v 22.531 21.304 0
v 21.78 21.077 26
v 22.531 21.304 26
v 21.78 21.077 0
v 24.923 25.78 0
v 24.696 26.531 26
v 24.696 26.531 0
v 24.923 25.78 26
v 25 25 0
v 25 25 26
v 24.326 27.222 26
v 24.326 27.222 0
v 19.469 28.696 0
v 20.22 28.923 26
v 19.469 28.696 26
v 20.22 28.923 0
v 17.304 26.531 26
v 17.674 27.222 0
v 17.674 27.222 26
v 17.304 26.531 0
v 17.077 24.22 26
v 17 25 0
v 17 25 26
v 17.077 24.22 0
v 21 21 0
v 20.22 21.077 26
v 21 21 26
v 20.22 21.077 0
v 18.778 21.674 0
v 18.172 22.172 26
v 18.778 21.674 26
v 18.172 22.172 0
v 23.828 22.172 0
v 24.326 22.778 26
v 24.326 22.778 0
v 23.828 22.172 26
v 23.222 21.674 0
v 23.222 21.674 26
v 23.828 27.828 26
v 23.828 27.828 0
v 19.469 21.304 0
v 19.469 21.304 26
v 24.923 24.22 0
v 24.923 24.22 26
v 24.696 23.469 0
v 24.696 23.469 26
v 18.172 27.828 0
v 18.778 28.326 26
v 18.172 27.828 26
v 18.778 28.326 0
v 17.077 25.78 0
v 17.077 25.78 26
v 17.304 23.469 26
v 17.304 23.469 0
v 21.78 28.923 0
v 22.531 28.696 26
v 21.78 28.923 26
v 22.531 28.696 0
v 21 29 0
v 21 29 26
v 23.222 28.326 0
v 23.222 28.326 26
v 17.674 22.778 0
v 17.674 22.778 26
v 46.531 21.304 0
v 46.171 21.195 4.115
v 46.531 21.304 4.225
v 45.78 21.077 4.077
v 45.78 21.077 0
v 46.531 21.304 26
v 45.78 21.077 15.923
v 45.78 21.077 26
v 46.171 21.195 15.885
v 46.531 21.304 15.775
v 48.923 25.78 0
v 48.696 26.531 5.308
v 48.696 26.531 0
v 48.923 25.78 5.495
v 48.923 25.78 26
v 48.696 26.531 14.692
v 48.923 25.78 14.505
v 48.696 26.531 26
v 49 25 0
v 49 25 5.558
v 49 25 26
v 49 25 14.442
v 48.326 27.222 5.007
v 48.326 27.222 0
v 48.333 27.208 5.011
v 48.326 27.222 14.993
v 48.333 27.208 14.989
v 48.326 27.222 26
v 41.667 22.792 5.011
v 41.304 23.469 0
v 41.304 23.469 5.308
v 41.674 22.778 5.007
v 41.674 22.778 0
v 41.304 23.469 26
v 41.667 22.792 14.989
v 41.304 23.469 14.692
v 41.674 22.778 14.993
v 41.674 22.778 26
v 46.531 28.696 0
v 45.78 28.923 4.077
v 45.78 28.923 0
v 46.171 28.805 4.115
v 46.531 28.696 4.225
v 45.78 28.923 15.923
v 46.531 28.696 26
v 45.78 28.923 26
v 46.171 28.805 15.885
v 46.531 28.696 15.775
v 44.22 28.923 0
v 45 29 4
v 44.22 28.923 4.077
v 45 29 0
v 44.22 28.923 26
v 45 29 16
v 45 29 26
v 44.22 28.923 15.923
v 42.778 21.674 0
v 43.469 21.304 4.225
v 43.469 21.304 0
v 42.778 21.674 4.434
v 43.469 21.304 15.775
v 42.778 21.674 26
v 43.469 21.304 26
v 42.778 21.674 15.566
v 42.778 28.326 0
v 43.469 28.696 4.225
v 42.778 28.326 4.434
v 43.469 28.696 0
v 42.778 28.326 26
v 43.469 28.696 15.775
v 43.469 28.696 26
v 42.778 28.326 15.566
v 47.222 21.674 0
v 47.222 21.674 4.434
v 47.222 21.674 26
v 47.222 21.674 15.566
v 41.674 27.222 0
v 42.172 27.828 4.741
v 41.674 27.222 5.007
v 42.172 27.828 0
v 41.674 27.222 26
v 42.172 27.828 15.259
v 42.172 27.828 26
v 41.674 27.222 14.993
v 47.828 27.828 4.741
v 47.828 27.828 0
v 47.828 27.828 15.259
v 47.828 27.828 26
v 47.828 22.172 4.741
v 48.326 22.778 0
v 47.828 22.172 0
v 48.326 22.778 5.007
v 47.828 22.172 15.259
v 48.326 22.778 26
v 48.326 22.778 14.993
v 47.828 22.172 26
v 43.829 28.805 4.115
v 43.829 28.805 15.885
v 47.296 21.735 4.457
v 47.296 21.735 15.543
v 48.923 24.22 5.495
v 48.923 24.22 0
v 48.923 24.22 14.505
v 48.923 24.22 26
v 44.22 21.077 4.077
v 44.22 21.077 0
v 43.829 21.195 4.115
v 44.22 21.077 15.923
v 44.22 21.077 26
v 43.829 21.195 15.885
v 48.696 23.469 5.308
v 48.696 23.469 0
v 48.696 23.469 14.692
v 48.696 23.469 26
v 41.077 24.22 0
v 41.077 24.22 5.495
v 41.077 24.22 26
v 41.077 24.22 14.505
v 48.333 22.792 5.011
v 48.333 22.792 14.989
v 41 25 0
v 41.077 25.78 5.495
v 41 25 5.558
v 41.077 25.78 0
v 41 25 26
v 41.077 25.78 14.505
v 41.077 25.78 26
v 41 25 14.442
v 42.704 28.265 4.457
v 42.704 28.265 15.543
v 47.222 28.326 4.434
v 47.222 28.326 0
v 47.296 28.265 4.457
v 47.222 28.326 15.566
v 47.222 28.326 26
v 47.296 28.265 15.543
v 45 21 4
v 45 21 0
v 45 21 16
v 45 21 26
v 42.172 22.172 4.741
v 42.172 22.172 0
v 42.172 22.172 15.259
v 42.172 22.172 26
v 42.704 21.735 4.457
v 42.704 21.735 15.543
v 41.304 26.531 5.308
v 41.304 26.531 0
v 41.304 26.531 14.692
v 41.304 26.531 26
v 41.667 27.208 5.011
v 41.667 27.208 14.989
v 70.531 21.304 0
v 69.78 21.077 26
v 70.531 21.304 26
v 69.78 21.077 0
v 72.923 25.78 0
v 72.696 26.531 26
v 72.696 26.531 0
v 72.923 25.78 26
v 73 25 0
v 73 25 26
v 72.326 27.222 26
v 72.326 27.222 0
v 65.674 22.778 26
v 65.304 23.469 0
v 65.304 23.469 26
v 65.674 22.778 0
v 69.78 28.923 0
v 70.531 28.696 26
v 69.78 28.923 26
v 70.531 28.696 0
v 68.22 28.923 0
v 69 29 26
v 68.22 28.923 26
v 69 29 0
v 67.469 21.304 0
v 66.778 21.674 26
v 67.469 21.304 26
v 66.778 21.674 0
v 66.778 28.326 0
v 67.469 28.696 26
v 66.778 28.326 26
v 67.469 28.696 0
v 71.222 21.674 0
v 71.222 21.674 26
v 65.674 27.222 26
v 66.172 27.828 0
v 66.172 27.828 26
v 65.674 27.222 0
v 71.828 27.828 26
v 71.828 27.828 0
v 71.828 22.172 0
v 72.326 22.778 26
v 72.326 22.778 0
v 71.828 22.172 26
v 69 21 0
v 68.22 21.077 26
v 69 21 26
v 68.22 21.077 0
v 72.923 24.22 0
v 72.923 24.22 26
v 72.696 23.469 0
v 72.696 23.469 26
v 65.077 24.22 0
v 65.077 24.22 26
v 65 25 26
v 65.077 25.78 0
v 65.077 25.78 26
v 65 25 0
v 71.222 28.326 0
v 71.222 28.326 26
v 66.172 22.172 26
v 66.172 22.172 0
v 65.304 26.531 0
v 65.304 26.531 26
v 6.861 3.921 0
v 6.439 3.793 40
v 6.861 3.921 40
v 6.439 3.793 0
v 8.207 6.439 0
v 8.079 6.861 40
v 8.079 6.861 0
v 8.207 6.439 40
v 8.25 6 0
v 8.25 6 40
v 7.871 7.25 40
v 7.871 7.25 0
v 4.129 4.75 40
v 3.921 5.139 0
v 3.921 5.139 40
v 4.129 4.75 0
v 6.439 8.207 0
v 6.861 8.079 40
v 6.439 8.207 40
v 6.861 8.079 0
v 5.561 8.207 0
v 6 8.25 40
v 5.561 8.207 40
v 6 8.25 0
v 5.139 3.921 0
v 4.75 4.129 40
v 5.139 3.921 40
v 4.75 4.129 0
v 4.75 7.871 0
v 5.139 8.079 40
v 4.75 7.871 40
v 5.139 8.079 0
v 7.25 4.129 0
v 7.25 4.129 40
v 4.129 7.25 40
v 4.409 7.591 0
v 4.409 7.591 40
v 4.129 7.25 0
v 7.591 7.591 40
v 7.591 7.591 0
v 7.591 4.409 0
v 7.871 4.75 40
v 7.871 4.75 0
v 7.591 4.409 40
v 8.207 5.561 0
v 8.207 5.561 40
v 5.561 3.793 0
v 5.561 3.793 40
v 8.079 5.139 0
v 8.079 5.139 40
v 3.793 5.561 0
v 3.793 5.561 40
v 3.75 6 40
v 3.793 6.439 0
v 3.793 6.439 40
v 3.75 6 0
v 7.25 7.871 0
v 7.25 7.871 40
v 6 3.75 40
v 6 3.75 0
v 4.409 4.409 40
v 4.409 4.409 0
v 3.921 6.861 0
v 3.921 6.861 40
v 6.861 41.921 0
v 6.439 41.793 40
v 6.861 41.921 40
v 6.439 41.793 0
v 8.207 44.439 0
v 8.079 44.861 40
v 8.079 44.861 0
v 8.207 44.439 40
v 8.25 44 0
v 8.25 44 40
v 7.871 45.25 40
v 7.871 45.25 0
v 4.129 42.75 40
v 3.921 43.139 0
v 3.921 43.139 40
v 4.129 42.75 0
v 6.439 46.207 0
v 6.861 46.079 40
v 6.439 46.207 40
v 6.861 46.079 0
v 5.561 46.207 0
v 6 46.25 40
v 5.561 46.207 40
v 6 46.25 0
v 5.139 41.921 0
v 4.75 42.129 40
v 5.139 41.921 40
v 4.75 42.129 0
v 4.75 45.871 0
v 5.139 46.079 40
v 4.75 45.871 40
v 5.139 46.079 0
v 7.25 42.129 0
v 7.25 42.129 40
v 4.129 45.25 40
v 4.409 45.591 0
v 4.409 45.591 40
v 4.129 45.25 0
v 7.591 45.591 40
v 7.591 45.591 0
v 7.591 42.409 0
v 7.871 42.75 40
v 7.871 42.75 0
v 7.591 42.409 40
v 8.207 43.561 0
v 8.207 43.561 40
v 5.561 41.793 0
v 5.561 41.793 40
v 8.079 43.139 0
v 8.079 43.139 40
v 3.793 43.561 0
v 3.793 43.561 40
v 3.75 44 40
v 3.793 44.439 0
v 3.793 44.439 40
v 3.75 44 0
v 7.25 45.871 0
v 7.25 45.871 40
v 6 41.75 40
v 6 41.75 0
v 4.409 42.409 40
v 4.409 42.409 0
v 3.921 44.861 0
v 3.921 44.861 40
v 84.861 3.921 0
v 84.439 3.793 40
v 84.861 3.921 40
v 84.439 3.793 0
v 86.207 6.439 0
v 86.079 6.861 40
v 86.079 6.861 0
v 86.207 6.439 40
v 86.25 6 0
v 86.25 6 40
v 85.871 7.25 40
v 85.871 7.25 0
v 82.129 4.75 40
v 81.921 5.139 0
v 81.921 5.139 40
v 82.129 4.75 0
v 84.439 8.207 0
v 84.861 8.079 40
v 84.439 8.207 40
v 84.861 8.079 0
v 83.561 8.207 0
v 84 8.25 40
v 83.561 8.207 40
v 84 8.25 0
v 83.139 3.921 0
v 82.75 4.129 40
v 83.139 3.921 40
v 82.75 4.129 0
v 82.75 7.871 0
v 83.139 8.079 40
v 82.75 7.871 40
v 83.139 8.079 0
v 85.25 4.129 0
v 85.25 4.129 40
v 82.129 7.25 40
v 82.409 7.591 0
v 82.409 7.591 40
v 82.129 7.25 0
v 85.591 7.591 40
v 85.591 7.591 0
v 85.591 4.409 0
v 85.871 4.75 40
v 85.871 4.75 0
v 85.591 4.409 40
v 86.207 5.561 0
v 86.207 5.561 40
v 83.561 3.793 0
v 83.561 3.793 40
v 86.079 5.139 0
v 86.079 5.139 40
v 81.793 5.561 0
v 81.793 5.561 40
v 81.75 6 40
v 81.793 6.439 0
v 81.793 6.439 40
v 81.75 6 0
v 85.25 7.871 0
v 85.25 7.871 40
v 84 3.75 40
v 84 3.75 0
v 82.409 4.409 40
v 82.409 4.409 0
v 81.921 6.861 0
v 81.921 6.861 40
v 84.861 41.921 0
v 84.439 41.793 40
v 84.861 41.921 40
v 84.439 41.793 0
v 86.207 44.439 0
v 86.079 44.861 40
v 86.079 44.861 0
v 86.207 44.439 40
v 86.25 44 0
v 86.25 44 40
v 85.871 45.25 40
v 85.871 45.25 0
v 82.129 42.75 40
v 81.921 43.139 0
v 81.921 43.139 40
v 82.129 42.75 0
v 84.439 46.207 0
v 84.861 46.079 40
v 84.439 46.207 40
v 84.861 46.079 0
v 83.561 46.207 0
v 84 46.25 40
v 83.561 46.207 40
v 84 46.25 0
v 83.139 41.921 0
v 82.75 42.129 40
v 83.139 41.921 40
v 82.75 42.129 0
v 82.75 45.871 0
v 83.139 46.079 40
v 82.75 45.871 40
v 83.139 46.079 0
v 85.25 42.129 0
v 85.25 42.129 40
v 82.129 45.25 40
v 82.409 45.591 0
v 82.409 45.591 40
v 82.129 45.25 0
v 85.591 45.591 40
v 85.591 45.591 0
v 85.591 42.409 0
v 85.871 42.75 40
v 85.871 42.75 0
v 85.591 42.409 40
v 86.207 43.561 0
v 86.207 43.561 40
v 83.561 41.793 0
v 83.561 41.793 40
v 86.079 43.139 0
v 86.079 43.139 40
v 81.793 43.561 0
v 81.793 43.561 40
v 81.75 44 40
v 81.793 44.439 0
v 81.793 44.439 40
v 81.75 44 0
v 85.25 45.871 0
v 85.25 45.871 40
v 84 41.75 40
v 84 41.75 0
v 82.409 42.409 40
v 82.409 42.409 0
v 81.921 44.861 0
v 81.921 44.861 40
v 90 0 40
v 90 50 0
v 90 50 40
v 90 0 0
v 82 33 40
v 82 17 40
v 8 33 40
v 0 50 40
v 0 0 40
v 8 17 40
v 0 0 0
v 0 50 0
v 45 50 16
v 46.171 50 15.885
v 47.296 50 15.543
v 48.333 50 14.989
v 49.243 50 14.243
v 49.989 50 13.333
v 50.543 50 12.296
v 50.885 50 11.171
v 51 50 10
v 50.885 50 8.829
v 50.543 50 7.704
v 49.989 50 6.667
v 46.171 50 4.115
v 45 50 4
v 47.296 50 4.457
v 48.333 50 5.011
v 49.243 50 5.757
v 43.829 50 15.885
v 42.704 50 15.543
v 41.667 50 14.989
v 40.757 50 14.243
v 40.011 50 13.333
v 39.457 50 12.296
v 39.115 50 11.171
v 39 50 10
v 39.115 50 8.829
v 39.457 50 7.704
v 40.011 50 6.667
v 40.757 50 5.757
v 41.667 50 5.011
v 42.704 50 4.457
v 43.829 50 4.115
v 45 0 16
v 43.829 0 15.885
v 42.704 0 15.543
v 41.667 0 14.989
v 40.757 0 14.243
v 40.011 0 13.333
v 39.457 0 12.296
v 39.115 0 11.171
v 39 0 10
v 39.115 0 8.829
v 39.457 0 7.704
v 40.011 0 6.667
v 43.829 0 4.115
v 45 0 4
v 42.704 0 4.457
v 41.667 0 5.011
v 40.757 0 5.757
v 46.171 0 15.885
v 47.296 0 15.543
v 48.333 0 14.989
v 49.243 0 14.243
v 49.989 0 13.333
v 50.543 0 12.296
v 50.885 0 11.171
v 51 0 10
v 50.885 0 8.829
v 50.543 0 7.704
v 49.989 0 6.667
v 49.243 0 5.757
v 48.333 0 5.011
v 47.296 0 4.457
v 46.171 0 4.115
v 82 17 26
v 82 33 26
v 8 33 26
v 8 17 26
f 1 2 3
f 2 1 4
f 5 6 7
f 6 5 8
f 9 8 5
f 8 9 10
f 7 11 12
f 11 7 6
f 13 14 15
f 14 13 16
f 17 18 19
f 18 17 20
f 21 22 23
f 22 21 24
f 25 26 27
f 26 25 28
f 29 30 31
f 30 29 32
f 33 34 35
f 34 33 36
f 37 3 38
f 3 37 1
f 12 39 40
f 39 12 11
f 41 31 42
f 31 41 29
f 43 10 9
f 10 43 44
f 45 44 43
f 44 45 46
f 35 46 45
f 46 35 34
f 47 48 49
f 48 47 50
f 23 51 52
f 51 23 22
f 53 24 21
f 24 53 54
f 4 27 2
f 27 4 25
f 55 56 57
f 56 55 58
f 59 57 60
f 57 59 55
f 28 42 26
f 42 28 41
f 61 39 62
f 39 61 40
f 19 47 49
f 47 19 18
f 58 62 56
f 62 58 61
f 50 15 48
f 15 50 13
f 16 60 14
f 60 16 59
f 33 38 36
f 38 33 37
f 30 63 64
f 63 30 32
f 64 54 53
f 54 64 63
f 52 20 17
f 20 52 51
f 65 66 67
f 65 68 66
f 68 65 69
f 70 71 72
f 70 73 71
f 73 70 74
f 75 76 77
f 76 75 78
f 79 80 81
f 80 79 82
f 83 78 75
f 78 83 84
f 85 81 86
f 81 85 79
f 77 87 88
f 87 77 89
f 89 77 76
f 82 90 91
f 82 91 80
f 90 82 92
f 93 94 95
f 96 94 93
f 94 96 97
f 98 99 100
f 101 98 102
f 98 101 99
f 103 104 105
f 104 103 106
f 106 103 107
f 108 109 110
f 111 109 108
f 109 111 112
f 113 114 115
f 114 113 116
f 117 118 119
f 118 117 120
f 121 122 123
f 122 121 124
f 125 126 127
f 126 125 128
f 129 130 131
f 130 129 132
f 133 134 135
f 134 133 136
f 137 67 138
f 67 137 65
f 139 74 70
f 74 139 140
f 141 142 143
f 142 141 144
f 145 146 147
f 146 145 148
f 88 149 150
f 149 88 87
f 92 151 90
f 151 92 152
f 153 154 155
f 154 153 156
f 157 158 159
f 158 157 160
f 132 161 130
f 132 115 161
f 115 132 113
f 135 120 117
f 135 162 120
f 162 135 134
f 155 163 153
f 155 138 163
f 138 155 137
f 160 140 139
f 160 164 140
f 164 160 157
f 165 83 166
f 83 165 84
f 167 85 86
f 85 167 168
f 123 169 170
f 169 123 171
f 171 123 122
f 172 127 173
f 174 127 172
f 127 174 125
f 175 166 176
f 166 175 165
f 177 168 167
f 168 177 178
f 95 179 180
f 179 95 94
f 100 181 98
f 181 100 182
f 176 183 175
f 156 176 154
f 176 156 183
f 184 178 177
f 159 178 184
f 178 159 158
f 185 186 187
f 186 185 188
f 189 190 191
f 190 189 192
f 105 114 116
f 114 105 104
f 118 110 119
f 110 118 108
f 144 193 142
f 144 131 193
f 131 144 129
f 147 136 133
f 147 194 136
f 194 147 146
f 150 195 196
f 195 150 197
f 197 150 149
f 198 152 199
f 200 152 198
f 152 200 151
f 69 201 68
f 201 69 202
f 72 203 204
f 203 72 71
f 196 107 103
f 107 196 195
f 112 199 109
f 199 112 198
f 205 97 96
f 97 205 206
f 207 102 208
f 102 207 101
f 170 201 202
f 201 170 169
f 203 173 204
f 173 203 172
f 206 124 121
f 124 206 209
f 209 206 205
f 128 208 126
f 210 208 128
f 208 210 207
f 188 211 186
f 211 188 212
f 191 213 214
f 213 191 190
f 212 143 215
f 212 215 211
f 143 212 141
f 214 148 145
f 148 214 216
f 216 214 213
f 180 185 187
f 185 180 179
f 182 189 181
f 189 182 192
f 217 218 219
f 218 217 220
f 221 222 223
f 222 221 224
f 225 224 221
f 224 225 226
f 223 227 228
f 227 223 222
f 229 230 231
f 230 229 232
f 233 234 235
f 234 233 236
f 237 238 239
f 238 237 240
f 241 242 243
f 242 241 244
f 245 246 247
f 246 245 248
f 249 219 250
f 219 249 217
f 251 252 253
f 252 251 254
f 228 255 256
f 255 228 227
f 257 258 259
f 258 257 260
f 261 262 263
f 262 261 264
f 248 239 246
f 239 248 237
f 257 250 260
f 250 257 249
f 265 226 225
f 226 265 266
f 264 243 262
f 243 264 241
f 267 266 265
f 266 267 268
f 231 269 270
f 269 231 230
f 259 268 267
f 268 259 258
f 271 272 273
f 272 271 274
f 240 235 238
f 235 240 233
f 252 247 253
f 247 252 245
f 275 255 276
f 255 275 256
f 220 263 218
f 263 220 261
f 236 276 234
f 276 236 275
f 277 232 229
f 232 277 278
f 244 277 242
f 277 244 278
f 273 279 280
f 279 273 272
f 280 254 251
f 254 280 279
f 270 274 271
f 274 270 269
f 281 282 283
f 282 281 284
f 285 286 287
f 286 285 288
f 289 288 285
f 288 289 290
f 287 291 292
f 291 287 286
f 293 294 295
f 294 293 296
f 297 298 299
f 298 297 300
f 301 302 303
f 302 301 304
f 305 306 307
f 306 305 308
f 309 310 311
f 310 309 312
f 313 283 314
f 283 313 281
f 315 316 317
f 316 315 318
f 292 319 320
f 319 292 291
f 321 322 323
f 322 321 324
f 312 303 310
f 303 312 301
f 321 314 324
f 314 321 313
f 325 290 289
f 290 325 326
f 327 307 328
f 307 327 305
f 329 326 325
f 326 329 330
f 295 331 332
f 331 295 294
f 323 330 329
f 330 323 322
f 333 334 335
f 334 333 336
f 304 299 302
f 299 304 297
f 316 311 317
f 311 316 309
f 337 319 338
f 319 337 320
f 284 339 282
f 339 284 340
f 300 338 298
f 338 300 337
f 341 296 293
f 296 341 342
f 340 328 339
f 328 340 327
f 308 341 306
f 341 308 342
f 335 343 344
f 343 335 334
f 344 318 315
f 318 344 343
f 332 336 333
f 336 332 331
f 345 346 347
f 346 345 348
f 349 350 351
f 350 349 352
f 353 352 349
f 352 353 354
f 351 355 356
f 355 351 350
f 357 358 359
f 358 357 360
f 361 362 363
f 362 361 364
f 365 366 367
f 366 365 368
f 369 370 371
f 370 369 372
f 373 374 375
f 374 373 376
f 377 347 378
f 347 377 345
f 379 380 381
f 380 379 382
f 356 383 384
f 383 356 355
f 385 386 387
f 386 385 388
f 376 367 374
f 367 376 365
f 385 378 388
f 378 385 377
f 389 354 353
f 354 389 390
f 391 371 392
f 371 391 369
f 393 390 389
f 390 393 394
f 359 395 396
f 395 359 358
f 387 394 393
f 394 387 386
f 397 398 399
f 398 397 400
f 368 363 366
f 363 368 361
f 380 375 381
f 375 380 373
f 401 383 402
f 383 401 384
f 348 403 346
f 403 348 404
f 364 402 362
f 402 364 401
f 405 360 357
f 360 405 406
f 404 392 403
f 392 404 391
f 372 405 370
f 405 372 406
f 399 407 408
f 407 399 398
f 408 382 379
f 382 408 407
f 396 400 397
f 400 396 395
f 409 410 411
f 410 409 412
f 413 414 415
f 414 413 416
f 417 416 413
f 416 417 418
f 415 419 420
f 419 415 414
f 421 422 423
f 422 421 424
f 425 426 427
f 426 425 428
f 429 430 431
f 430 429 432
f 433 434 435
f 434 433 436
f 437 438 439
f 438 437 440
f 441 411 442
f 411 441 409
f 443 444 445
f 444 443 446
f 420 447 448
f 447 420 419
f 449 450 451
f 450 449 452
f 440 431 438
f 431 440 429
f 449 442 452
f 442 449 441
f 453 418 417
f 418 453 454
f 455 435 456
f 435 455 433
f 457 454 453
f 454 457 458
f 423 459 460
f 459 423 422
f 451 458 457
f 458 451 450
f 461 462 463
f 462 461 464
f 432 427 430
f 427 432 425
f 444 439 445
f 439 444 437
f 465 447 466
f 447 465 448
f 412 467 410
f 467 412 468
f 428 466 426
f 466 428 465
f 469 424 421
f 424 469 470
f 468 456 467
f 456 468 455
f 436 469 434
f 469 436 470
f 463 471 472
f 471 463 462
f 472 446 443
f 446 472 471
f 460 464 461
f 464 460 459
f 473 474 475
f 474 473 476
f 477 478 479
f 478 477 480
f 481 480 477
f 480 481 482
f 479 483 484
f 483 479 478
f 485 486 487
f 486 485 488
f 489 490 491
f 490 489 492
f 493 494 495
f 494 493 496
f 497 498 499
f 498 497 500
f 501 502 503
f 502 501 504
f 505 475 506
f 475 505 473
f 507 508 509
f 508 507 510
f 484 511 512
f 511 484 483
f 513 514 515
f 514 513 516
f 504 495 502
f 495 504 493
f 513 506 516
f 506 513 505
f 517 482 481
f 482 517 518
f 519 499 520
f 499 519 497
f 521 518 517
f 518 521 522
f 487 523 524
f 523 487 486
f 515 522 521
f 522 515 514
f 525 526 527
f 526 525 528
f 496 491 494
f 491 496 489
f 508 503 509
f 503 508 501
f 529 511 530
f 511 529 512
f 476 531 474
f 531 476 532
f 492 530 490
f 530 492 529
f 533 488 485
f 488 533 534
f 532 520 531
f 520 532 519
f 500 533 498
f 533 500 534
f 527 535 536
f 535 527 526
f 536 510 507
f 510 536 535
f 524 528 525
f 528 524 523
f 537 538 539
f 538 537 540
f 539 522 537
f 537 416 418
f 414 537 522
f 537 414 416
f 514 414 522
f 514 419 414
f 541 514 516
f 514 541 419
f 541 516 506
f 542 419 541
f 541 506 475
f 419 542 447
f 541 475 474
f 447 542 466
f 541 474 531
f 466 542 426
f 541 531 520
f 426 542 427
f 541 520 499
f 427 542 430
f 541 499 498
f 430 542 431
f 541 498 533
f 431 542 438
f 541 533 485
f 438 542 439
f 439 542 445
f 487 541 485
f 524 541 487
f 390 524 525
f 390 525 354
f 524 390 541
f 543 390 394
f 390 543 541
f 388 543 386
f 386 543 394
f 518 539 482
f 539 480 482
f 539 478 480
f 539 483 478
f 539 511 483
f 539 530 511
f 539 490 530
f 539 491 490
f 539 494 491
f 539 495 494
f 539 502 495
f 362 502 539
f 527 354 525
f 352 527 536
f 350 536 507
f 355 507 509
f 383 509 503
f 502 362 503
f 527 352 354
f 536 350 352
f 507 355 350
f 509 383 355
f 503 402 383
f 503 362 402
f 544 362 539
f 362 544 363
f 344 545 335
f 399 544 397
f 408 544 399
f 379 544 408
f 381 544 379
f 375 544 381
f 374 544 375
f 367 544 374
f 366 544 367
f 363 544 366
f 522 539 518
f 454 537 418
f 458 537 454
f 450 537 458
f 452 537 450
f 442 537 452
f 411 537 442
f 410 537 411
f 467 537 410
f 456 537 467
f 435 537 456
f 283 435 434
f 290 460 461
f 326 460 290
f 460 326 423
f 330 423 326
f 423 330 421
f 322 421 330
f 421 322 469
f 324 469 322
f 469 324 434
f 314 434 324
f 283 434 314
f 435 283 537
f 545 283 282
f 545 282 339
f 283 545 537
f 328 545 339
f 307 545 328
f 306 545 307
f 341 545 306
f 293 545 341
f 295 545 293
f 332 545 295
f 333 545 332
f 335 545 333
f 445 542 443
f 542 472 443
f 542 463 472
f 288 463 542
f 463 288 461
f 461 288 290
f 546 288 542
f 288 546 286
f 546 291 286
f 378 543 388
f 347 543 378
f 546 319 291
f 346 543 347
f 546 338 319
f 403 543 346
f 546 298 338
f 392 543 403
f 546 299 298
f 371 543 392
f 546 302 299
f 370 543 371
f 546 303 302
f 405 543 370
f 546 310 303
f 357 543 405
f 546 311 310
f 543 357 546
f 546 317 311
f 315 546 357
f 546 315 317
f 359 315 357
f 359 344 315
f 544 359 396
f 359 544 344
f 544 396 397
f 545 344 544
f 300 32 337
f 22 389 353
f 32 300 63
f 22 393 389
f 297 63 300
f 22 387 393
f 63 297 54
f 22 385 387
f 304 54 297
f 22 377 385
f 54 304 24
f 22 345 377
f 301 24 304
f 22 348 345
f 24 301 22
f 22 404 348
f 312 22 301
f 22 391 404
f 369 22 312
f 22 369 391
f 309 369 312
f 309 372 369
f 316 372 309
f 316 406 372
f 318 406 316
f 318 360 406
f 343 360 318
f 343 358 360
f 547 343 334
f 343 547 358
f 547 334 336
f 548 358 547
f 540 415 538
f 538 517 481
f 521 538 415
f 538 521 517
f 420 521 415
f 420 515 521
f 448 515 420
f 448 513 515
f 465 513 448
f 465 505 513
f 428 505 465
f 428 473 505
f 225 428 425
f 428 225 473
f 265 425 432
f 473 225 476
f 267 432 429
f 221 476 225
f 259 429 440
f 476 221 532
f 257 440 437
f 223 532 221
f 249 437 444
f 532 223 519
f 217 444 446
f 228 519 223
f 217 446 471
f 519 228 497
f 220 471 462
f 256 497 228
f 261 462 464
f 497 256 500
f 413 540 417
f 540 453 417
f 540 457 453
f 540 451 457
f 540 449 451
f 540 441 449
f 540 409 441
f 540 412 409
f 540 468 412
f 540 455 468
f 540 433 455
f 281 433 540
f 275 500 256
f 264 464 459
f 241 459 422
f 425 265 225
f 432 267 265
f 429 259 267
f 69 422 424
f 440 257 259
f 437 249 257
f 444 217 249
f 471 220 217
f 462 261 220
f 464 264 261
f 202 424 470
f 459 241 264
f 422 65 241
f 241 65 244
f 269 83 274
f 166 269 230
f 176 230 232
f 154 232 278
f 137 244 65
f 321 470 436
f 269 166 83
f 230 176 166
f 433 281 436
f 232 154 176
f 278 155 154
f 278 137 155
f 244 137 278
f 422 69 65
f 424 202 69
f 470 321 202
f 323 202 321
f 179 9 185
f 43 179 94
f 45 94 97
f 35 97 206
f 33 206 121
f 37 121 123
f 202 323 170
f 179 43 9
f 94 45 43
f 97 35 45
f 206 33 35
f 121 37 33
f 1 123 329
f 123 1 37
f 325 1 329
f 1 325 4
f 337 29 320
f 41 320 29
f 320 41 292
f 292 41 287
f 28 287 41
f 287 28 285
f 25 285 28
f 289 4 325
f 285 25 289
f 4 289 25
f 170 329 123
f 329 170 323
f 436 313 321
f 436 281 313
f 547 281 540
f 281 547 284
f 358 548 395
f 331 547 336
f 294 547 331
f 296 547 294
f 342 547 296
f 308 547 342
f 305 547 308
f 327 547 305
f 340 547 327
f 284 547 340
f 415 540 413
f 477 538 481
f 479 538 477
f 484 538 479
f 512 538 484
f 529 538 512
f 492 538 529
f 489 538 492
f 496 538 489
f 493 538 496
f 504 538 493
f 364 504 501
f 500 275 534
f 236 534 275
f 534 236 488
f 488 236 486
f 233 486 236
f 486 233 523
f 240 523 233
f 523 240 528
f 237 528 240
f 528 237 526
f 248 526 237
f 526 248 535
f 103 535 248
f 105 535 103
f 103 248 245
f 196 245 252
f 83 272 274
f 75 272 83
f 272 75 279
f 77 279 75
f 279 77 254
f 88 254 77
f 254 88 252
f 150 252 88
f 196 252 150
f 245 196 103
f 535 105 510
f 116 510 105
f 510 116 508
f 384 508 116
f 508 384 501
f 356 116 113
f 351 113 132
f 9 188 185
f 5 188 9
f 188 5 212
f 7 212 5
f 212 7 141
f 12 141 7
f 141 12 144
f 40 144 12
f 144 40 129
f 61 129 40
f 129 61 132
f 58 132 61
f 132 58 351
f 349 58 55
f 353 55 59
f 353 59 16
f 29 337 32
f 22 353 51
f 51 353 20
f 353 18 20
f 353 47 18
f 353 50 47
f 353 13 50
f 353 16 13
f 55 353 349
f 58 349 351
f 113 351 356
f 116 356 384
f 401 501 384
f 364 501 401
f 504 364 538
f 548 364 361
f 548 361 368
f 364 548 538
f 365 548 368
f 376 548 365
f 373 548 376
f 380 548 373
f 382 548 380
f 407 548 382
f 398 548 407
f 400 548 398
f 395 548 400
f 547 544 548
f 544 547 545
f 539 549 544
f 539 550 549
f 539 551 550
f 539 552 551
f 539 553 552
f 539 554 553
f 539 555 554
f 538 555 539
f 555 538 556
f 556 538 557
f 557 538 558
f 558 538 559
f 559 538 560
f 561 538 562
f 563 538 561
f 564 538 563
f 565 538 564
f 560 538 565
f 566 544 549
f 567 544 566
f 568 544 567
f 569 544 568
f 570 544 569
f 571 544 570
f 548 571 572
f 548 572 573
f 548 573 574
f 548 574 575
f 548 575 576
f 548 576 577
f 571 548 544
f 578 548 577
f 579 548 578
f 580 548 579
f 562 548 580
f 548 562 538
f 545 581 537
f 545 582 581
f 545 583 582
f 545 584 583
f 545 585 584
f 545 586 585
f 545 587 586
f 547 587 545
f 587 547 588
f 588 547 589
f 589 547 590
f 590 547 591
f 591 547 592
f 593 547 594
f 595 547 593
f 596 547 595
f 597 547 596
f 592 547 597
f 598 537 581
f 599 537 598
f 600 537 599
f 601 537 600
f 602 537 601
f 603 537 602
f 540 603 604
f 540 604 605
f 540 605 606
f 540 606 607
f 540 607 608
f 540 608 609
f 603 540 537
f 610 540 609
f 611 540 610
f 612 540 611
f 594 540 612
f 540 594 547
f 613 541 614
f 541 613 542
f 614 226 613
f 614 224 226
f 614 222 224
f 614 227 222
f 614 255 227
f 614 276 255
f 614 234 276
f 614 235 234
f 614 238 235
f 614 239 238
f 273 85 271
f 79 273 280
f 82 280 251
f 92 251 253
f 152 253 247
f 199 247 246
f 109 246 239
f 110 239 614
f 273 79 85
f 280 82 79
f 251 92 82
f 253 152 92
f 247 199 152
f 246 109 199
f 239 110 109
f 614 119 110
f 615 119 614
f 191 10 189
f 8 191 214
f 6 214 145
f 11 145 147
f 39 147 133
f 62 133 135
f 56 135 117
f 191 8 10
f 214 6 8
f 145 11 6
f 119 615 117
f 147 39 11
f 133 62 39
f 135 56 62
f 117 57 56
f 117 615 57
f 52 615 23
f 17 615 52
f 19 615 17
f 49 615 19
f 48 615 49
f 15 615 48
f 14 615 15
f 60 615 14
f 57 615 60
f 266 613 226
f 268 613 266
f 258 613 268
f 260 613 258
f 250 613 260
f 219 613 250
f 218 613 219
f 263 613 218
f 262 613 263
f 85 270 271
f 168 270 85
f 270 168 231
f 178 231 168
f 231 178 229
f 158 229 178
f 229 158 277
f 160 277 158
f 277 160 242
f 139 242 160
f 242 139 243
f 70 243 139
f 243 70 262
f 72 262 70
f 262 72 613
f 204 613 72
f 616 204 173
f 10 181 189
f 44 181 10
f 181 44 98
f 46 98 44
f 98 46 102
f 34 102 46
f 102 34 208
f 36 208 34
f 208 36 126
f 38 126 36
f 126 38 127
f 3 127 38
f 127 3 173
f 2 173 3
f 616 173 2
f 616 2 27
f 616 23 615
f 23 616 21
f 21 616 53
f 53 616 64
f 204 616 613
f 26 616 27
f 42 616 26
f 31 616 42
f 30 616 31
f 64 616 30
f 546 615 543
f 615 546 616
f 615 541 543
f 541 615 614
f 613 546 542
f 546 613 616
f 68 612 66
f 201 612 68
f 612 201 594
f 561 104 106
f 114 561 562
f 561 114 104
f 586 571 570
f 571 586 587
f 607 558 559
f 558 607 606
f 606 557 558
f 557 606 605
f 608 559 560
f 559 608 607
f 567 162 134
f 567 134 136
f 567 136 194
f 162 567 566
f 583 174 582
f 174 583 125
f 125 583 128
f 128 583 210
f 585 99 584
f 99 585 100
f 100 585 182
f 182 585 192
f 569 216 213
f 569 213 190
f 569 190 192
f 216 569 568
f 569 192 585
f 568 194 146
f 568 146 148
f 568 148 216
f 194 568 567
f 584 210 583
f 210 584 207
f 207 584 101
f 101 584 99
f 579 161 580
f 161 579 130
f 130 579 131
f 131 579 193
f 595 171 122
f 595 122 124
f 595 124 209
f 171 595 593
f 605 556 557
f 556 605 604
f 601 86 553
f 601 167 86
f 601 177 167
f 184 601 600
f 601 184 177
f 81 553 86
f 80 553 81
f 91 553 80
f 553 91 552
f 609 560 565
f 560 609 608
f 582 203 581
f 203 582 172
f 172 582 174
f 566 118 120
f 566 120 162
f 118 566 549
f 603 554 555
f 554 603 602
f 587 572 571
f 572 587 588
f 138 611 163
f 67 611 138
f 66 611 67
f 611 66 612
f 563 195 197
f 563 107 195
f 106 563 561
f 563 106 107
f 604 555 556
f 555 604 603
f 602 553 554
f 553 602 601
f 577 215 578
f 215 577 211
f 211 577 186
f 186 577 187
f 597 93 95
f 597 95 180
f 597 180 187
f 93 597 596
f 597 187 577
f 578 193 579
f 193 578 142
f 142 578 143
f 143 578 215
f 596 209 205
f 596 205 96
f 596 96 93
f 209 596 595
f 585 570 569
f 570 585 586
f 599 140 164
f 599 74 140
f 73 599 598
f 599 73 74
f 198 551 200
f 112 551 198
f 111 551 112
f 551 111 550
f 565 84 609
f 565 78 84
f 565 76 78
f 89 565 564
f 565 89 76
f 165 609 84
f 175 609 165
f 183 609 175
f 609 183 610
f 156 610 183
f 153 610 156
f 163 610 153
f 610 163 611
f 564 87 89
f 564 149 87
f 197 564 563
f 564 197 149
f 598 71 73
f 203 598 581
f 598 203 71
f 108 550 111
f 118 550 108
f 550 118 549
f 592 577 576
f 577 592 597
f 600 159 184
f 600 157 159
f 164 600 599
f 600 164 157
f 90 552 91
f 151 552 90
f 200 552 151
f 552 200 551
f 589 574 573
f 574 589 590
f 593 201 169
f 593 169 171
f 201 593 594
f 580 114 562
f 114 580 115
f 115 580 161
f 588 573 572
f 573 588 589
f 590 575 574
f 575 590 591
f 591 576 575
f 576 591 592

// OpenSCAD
$fn = 32;

// ----------------------------------------------------------------------
// Manifold block: side_outlet manifold
// ----------------------------------------------------------------------

// --- parameters (mm) ---
block_l = 90;             // block length, X
block_w = 50;             // block width, Y
block_h = 40;             // block height, Z
port_d = 8;               // port bore diameter
port_pitch = 24;          // port pitch along X
gallery_d = 16;           // top gallery width, Y
gallery_depth = 14;       // gallery pocket depth
wall_p = 8;               // gallery end wall thickness, X
mnt_d = 4.5;              // mounting hole diameter
mnt_in = 6;               // mounting hole inset from the edges
out_d = 12;               // outlet bore diameter
out_z = 10;               // outlet axis height
fit_tol = 0.05;           // tolerance for press fits, mm
free_tol = 0.2;           // tolerance for clearance fits, mm

n_ports = 3;  // ports in the row
port_x0 = (block_l - (n_ports - 1) * port_pitch) / 2;  // first port X

difference() {
  cube([block_l, block_w, block_h]);
  for (i = [0 : n_ports - 1])
    translate([port_x0 + i * port_pitch, block_w / 2, -1])
      cylinder(h = block_h + 2, d = port_d);
  translate([wall_p, block_w / 2 - gallery_d / 2, block_h - gallery_depth])
    cube([block_l - 2 * wall_p, gallery_d, gallery_depth + 1]);
  for (cx = [mnt_in, block_l - mnt_in])
    for (cy = [mnt_in, block_w - mnt_in])
      translate([cx, cy, -1]) cylinder(h = block_h + 2, d = mnt_d);
  translate([block_l / 2, -1, out_z]) rotate([-90, 0, 0])
    cylinder(h = block_w + 2, d = out_d);
}
